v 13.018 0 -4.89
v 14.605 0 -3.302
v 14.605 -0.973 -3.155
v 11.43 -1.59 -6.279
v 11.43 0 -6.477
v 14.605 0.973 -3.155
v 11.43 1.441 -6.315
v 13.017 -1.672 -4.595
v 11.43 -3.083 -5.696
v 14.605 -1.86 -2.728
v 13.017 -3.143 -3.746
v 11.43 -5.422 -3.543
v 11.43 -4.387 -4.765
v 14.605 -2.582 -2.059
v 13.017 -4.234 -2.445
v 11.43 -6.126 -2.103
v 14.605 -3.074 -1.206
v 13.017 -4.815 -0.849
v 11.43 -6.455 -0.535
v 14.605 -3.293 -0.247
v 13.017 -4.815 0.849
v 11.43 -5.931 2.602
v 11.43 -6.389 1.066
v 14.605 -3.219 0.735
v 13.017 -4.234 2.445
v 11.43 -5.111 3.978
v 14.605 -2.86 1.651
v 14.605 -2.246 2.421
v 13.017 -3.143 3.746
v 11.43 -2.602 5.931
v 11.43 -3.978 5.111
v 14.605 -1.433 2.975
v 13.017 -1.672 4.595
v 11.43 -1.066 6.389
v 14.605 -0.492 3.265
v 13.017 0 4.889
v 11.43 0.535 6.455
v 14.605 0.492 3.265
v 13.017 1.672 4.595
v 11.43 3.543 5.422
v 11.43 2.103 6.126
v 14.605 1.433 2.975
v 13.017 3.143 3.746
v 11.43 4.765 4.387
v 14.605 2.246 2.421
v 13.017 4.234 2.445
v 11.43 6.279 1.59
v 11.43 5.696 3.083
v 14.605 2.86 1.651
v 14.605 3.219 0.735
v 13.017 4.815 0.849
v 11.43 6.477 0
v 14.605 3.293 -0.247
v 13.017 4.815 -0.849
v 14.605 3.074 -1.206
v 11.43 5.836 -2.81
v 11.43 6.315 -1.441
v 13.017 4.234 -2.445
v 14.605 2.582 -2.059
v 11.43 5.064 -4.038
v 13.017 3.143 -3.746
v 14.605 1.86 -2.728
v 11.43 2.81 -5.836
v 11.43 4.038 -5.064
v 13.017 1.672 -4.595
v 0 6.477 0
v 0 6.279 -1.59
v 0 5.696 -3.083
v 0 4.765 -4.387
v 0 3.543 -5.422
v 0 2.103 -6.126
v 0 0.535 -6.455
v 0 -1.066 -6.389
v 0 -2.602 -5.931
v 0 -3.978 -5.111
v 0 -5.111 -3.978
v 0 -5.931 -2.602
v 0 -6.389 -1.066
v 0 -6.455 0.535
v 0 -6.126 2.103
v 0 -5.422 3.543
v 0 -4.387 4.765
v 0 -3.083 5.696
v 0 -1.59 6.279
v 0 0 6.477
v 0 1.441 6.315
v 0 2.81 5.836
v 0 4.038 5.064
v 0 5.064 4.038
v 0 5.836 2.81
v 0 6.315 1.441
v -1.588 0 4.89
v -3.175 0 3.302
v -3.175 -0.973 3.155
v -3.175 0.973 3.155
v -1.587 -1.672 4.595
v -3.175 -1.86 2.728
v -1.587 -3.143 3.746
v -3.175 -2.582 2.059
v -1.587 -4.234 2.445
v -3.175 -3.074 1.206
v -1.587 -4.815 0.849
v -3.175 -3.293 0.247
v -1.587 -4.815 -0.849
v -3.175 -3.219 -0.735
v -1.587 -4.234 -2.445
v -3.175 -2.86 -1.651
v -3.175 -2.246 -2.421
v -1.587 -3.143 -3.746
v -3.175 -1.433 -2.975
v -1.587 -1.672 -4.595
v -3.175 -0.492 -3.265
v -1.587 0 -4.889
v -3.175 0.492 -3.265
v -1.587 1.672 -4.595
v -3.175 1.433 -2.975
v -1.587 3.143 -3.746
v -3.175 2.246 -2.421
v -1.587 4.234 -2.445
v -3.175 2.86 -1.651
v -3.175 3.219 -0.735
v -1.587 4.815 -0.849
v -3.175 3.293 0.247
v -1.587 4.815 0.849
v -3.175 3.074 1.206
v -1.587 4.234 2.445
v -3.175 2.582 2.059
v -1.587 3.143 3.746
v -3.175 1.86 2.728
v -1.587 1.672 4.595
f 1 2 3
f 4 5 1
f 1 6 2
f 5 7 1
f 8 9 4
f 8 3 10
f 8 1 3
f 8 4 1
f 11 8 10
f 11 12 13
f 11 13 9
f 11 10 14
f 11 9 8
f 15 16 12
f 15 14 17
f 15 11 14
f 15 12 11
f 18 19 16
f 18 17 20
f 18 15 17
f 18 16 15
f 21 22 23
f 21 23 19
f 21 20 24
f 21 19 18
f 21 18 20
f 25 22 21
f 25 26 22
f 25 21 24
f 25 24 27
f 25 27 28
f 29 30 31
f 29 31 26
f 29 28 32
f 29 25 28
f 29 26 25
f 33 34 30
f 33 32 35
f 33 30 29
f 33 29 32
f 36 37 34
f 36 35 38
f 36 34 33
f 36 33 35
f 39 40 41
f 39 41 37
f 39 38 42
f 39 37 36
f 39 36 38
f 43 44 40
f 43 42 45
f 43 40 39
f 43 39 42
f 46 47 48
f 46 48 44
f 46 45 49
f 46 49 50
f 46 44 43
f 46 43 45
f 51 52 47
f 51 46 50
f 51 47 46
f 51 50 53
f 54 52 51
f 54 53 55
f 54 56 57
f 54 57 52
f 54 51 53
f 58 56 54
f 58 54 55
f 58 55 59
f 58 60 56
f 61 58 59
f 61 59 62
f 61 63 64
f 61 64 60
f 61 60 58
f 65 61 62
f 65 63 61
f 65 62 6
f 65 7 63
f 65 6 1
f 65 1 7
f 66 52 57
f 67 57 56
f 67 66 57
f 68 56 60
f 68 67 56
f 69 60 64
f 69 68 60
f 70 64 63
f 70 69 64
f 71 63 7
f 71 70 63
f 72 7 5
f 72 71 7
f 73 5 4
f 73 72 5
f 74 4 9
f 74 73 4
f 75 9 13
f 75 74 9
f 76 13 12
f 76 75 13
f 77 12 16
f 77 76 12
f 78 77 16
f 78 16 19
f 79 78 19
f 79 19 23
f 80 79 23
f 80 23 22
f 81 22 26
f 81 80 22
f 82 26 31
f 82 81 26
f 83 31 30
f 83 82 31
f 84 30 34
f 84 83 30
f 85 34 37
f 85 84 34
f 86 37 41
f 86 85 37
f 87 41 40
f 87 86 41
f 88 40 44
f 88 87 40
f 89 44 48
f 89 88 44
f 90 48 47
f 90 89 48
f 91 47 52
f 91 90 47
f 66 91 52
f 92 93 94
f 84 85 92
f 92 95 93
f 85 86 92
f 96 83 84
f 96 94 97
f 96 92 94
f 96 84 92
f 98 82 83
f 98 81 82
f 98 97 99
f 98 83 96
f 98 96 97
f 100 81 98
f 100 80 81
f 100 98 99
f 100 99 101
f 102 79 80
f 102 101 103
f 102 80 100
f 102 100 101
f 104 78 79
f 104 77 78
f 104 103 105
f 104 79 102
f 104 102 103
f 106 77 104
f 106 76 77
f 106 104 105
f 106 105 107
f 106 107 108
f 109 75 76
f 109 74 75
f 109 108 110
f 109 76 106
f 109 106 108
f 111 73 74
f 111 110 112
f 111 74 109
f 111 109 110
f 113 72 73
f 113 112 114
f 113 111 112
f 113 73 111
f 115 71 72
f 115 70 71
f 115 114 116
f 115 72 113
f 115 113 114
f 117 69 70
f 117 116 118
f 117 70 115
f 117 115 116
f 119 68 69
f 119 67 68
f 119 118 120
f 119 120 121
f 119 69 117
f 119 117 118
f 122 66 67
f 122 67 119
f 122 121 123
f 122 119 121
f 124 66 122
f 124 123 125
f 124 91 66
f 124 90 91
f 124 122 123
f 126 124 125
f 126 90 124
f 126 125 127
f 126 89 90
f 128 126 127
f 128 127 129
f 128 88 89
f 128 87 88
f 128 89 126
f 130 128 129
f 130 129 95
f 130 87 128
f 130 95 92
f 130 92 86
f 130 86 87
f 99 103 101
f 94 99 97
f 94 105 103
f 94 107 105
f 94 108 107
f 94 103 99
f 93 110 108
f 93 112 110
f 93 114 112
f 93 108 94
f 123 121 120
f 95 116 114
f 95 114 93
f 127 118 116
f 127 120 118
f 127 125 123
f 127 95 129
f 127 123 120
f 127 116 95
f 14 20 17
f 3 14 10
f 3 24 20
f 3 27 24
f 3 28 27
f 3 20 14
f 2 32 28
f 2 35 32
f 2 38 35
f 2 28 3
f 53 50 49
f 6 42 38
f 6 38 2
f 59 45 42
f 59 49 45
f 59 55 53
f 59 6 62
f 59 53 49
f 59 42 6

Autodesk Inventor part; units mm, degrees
ref_plane "YZ Plane" through (0, 0, 0) normal (1, 0, 0) x (0, 1, 0)
sketch "Sketch1" plane through (0, 0, 0) normal (1, 0, 0) x (0, 1, 0)
  circle A0 centre (0, 0) radius 6.477
  dimension "d0" = 12.954
extrude "Extrusion1" add sketch "Sketch1" along normal blind 11.43
sketch "Sketch2" plane through (11.43, 0, 0) normal (1, 0, 0) x (0, 0, -1)
  circle A0 centre (0, 0) radius 6.477
ref_plane "Work Plane1" through (14.605, 0, 0) normal (1, 0, 0) x (0, 0, -1)
sketch "Sketch3" plane through (14.605, 0, 0) normal (1, 0, 0) x (0, 0, -1)
  circle A0 centre (0, 0) radius 3.302
  dimension "d4" = 6.604
loft "Loft1" add profiles "Sketch3" section 2 edges at (11.43, -6.477, 0)
ref_plane "Work Plane2" through (-3.175, 0, 0) normal (-1, 0, 0) x (0, 0, 1)
sketch "Sketch4" plane through (-3.175, 0, 0) normal (-1, 0, 0) x (0, 0, 1)
  circle A0 centre (0, 0) radius 3.302
  dimension "d10" = 6.604
loft "Loft2" add profiles "Sketch4" section 2 edges at (0, -6.477, 0)
properties part number "shaft 6x24"
